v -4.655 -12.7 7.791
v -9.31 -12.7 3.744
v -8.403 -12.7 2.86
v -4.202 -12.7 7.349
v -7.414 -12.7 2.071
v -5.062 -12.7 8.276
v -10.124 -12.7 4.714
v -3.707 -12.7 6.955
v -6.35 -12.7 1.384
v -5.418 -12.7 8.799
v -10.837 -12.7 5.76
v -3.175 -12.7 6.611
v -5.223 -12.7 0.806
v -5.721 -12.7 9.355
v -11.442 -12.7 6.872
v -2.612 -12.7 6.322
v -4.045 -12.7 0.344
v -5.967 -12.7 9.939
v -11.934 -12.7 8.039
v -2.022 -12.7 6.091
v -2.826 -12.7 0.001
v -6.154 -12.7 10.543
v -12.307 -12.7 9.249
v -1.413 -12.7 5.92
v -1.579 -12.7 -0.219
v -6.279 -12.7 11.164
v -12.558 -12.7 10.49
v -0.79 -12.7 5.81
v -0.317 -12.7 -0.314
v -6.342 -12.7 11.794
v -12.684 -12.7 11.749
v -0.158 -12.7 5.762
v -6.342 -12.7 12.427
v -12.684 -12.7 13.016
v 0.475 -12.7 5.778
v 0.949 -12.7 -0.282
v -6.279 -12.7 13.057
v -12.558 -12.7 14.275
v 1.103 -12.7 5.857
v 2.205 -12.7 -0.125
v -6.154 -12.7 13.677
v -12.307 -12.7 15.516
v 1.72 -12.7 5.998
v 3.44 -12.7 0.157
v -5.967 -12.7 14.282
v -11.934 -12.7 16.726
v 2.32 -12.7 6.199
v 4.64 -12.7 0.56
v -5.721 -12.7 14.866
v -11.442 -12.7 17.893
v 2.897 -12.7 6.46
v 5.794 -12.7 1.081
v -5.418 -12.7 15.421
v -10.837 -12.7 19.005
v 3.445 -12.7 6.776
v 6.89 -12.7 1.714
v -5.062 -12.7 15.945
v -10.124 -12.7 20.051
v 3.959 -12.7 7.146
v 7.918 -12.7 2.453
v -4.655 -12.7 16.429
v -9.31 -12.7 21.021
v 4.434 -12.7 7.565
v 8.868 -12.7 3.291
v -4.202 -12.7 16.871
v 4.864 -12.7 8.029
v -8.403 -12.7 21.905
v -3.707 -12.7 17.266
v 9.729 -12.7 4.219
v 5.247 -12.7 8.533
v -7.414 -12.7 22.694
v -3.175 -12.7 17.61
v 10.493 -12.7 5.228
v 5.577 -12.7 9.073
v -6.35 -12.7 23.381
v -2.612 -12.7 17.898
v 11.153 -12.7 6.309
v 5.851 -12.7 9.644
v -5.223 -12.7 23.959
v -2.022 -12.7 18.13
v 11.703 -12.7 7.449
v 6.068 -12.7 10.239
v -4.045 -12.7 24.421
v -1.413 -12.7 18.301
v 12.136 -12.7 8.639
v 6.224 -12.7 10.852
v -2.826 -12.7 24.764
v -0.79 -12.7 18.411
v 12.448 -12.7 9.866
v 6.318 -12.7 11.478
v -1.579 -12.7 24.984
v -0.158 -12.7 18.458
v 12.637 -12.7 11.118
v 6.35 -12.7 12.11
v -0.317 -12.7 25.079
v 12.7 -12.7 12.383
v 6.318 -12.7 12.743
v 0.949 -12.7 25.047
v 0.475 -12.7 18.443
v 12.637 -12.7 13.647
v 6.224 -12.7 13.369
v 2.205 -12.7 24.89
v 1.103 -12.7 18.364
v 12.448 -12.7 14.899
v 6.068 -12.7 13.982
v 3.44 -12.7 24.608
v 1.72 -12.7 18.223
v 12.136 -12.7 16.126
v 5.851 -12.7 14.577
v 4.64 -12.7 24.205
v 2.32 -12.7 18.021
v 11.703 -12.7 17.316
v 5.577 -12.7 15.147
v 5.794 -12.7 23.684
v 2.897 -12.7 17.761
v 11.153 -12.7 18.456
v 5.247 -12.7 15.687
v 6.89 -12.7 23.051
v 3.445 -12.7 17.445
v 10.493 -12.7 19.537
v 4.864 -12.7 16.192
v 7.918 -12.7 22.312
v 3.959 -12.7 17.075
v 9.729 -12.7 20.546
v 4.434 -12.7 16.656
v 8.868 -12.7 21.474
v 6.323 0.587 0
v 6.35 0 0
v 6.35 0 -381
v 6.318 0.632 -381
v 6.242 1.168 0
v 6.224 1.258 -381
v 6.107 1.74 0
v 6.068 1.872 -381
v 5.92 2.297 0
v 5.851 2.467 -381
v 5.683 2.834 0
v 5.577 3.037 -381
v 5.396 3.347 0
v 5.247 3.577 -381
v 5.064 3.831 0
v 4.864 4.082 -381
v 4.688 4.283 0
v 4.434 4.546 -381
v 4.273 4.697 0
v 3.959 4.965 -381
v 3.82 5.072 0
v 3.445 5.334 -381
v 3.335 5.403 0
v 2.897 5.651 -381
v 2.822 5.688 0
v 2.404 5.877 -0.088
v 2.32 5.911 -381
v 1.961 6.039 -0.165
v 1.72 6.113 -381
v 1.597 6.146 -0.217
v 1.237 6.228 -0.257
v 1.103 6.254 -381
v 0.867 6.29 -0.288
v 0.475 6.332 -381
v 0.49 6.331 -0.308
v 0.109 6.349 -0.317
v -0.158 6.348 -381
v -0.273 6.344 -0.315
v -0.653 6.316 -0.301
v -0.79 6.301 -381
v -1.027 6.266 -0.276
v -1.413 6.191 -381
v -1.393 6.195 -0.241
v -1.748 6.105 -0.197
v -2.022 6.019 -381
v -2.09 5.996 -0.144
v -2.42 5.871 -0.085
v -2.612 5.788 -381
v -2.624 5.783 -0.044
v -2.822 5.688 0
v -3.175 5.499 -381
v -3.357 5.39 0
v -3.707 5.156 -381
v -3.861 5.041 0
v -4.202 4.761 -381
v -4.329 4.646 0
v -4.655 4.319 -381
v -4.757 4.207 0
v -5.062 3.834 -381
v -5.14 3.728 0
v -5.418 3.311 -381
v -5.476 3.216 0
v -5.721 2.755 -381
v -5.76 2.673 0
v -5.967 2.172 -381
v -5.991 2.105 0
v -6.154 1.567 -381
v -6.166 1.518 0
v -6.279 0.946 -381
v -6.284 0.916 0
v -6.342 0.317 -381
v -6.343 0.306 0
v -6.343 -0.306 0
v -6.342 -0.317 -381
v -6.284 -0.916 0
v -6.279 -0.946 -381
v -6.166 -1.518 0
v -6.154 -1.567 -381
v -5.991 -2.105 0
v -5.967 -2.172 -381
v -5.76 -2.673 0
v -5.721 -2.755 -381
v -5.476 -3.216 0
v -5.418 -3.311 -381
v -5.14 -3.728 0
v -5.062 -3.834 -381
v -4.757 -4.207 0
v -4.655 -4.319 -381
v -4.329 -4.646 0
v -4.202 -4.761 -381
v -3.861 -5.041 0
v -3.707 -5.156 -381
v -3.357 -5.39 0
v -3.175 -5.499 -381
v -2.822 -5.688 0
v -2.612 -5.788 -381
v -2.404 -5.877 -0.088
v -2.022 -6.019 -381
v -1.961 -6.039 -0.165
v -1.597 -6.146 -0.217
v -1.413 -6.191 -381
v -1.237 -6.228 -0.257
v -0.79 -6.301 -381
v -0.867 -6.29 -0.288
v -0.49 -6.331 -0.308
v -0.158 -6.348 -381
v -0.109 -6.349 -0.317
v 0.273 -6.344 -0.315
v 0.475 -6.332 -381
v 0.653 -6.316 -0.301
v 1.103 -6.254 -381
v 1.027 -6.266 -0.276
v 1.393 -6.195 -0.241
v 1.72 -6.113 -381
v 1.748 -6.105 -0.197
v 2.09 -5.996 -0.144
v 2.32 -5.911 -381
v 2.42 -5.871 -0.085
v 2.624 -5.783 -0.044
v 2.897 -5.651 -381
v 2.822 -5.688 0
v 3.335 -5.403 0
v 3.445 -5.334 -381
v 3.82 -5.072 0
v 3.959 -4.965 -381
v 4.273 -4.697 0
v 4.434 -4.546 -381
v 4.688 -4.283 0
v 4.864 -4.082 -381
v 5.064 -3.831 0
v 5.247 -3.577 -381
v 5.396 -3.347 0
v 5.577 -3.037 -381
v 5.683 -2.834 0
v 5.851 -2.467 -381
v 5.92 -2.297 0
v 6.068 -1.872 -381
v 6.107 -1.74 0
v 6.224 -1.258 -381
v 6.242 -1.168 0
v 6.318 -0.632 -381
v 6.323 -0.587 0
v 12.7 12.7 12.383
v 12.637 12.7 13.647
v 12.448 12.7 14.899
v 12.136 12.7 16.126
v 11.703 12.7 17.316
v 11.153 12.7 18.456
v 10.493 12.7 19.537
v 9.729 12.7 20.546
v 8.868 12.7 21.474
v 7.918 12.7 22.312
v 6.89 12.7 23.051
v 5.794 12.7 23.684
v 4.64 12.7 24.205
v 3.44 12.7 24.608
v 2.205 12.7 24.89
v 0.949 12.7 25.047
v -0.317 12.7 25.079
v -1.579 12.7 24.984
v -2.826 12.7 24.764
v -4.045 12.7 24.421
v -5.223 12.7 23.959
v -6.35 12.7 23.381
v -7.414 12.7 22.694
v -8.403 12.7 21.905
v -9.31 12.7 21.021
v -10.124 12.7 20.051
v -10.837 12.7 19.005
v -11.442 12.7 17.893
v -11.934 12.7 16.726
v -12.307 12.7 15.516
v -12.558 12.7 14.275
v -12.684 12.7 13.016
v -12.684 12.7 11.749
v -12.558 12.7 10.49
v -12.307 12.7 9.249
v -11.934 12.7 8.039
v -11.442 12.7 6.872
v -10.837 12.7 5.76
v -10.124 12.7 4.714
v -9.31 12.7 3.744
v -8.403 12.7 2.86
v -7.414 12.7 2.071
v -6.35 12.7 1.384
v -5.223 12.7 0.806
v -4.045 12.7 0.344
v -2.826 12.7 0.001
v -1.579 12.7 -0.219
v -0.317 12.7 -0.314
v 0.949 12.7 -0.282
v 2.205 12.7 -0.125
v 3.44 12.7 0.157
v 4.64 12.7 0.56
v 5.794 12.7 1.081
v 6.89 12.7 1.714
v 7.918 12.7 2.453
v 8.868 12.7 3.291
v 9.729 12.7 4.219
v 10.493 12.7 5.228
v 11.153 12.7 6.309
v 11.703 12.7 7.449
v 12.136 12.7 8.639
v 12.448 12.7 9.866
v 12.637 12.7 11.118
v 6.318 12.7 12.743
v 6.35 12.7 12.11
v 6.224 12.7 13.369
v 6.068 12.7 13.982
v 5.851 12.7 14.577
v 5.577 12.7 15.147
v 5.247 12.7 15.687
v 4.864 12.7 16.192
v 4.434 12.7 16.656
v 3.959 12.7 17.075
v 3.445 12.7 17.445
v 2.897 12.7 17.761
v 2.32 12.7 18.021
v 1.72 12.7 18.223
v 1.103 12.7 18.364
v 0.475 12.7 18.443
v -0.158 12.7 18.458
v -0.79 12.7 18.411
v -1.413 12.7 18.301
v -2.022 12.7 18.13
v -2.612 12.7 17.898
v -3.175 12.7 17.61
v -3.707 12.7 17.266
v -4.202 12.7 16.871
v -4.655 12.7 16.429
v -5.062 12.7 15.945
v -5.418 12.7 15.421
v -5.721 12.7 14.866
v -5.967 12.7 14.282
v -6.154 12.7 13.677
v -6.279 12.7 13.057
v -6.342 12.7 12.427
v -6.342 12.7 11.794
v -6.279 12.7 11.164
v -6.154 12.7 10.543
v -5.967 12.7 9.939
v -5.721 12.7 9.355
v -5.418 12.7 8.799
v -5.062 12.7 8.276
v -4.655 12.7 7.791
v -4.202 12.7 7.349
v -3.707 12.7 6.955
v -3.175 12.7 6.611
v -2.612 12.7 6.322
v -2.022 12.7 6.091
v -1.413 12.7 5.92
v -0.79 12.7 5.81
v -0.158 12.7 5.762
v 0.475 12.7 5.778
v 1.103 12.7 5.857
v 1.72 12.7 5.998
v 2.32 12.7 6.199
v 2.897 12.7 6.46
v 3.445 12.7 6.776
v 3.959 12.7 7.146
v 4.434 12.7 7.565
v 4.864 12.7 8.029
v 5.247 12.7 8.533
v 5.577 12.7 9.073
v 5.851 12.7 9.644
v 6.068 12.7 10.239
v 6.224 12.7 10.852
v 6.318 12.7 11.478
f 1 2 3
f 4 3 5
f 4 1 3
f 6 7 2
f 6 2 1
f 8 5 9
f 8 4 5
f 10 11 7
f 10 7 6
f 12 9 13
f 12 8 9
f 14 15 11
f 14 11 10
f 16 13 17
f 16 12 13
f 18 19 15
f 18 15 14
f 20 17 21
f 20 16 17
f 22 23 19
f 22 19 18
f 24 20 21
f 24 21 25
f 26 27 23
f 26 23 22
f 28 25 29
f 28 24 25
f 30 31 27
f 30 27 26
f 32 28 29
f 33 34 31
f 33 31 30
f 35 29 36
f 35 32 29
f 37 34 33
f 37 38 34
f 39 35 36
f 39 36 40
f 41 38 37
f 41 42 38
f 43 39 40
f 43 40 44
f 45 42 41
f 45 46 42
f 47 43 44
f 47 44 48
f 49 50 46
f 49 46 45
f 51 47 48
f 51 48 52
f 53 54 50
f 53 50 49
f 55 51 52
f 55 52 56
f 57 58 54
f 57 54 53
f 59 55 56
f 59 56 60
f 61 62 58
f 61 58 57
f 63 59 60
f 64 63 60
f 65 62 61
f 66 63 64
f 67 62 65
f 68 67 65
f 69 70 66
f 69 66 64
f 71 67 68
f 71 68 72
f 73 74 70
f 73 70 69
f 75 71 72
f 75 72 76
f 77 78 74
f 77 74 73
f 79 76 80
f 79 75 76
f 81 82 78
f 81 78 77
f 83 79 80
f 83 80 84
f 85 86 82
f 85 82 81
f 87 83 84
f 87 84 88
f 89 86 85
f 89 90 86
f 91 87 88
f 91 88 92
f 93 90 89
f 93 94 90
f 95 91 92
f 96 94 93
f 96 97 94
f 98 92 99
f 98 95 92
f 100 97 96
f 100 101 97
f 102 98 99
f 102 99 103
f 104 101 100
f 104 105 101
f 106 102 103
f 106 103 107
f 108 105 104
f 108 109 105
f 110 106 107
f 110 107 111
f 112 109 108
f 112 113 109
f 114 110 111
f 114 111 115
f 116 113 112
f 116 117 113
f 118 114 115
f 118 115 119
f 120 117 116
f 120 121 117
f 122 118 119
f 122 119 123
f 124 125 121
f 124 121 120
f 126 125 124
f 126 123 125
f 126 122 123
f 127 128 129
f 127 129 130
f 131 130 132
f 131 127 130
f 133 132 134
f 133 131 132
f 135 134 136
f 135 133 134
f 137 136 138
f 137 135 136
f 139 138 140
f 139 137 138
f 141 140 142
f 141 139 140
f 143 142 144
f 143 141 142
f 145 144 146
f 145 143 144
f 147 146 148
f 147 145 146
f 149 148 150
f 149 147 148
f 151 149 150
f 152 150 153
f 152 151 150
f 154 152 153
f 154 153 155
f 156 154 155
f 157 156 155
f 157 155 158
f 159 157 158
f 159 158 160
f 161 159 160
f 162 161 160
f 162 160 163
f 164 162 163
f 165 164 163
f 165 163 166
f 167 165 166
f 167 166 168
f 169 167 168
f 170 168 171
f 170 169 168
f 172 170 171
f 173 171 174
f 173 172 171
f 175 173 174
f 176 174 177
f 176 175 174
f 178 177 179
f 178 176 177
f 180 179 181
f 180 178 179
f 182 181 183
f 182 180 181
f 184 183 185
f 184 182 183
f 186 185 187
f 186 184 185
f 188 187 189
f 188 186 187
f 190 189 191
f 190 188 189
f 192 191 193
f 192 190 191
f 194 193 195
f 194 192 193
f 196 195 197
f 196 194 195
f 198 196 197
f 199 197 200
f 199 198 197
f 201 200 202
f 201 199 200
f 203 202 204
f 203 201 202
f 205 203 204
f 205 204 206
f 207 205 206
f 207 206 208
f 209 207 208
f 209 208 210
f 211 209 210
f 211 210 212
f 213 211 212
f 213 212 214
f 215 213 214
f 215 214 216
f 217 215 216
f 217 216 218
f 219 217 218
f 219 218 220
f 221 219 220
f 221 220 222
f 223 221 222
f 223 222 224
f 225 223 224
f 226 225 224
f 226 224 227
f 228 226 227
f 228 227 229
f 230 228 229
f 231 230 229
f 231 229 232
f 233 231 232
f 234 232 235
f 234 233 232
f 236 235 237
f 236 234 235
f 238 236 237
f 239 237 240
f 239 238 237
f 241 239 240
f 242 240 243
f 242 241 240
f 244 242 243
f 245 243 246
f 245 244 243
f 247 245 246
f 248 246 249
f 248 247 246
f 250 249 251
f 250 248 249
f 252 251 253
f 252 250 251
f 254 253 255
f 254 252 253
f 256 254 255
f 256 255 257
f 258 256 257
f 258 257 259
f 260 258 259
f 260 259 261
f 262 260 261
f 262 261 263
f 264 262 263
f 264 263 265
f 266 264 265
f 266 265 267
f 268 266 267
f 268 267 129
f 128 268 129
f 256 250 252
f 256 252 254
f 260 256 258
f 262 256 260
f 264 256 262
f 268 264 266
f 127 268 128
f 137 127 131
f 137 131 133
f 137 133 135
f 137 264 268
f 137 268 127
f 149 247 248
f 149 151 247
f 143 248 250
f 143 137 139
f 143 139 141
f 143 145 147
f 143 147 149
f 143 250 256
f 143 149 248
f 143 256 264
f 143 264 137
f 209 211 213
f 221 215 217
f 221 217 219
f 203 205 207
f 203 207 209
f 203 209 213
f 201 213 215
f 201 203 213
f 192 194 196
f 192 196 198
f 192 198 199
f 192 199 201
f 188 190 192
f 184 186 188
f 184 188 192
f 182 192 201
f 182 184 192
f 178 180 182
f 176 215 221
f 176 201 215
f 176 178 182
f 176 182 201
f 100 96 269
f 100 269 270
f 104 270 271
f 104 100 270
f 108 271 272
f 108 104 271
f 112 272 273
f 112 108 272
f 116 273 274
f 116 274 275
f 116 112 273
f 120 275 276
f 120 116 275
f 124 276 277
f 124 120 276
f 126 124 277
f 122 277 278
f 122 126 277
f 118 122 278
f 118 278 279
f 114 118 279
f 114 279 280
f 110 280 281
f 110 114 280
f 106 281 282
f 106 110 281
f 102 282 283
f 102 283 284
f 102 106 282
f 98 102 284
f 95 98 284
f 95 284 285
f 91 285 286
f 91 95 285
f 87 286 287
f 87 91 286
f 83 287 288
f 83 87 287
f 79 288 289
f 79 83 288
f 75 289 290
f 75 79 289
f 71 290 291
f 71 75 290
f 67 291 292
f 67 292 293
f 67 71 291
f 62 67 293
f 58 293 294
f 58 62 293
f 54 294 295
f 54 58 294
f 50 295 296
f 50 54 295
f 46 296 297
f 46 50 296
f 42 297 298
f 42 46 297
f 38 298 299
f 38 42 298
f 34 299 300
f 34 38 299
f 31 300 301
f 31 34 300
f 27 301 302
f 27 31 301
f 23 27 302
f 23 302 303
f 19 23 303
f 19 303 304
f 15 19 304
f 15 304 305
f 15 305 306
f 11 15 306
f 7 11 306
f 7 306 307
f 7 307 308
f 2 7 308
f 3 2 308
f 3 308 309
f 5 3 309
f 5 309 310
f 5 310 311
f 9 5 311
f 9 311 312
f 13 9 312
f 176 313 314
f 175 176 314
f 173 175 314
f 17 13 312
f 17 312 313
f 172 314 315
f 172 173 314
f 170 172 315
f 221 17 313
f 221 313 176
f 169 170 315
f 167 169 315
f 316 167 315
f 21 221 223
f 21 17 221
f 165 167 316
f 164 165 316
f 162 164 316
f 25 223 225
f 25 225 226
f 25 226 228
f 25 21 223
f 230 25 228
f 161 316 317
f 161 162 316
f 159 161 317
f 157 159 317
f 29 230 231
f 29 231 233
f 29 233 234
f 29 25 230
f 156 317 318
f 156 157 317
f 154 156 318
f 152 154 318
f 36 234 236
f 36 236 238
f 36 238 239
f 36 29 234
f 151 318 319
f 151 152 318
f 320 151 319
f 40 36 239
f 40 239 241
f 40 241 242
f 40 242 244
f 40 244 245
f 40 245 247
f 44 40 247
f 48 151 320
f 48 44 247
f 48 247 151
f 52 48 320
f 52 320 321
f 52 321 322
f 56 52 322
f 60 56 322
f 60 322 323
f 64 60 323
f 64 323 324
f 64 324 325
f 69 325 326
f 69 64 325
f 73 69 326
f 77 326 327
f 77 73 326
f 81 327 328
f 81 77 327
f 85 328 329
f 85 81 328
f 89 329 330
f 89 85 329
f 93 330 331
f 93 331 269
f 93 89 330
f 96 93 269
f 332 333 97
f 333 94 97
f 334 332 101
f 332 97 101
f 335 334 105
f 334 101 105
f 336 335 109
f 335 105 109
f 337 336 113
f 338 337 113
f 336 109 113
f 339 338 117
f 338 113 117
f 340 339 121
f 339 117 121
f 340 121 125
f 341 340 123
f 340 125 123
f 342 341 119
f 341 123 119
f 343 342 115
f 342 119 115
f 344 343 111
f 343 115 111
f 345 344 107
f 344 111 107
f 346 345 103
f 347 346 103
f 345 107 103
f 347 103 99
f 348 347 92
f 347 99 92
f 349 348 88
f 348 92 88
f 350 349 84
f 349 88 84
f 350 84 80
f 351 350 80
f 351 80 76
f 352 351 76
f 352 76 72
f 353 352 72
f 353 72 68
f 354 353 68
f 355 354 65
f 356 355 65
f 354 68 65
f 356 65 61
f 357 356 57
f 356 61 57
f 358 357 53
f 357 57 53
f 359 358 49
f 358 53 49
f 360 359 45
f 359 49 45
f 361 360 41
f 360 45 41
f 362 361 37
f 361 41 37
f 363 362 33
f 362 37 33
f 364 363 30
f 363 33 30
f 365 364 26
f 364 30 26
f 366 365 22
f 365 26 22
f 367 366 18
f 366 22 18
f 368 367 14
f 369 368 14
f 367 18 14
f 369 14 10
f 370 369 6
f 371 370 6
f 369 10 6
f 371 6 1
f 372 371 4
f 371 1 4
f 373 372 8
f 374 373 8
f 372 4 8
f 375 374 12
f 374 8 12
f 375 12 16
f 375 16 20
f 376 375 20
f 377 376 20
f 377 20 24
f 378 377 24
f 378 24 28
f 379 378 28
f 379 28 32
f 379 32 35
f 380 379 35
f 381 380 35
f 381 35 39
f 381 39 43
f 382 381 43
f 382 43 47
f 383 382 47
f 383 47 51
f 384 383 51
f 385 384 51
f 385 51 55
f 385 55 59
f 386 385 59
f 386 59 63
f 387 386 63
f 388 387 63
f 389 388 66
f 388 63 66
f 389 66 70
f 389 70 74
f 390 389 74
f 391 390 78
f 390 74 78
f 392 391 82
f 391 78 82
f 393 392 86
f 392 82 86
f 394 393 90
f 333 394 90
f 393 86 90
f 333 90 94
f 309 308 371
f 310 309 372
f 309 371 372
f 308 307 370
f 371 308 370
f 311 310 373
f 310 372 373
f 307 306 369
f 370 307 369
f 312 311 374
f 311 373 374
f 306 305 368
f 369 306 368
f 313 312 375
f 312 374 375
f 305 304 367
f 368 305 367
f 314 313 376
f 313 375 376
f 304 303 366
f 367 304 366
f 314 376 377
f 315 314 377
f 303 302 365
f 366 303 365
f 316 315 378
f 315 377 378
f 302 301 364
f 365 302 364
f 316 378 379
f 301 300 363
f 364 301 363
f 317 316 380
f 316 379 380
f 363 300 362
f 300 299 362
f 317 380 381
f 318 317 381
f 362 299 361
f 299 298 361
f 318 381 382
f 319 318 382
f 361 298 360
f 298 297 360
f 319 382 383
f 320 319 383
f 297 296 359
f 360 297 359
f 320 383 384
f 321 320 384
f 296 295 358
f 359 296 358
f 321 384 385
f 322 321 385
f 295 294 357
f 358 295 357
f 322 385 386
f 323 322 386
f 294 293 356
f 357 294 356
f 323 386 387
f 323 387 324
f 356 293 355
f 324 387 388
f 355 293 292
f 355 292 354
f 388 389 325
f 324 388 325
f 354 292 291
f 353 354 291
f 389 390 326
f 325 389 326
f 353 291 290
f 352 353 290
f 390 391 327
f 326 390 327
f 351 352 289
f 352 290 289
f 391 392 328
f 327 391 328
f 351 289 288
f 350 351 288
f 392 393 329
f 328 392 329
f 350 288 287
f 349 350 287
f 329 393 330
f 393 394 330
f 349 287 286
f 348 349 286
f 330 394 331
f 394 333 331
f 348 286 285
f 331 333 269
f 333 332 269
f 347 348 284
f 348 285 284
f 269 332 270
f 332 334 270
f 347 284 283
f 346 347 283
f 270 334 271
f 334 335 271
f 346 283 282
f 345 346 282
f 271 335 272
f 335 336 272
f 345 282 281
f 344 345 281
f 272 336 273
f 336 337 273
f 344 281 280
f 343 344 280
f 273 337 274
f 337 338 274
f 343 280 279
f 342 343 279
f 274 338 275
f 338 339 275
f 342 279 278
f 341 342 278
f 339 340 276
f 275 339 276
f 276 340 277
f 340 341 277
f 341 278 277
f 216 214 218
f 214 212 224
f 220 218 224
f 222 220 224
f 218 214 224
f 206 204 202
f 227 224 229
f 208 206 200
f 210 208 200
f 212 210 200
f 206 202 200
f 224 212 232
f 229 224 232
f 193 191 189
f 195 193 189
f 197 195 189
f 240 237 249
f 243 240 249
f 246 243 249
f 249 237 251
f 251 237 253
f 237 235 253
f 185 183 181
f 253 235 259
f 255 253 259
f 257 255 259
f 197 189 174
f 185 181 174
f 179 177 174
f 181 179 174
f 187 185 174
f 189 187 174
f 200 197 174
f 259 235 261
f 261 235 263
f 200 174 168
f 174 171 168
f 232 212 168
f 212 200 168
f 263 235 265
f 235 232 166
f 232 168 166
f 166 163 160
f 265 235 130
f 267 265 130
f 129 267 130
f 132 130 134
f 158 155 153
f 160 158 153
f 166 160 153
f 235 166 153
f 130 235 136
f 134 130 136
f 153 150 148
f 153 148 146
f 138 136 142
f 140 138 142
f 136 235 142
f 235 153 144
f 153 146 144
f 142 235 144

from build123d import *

# Parameters (mm, degrees)
F0_R     = 6.35
F1_DEPTH = 381
F2_R     = 12.7
F3_DEPTH = 12.7
F4_R     = 6.35
F5_DEPTH = 12.7


with BuildPart() as f1:
    # F0 (on Top) → F1 (new body)
    with BuildSketch(Plane.XY):
        Circle(F0_R)
    extrude(amount=-F1_DEPTH)

    # F2 (on Front) → F3 (join, symmetric)
    with BuildSketch(Plane.XZ):
        with Locations((0, 12.382501)):
            Circle(F2_R)
    extrude(amount=F3_DEPTH, both=True)

    # F4 (on Front) → F5 (cut, symmetric)
    with BuildSketch(Plane.XZ):
        with Locations((0, 12.110357)):
            Circle(F4_R)
    extrude(amount=F5_DEPTH, both=True, mode=Mode.SUBTRACT)


solid = f1.part
